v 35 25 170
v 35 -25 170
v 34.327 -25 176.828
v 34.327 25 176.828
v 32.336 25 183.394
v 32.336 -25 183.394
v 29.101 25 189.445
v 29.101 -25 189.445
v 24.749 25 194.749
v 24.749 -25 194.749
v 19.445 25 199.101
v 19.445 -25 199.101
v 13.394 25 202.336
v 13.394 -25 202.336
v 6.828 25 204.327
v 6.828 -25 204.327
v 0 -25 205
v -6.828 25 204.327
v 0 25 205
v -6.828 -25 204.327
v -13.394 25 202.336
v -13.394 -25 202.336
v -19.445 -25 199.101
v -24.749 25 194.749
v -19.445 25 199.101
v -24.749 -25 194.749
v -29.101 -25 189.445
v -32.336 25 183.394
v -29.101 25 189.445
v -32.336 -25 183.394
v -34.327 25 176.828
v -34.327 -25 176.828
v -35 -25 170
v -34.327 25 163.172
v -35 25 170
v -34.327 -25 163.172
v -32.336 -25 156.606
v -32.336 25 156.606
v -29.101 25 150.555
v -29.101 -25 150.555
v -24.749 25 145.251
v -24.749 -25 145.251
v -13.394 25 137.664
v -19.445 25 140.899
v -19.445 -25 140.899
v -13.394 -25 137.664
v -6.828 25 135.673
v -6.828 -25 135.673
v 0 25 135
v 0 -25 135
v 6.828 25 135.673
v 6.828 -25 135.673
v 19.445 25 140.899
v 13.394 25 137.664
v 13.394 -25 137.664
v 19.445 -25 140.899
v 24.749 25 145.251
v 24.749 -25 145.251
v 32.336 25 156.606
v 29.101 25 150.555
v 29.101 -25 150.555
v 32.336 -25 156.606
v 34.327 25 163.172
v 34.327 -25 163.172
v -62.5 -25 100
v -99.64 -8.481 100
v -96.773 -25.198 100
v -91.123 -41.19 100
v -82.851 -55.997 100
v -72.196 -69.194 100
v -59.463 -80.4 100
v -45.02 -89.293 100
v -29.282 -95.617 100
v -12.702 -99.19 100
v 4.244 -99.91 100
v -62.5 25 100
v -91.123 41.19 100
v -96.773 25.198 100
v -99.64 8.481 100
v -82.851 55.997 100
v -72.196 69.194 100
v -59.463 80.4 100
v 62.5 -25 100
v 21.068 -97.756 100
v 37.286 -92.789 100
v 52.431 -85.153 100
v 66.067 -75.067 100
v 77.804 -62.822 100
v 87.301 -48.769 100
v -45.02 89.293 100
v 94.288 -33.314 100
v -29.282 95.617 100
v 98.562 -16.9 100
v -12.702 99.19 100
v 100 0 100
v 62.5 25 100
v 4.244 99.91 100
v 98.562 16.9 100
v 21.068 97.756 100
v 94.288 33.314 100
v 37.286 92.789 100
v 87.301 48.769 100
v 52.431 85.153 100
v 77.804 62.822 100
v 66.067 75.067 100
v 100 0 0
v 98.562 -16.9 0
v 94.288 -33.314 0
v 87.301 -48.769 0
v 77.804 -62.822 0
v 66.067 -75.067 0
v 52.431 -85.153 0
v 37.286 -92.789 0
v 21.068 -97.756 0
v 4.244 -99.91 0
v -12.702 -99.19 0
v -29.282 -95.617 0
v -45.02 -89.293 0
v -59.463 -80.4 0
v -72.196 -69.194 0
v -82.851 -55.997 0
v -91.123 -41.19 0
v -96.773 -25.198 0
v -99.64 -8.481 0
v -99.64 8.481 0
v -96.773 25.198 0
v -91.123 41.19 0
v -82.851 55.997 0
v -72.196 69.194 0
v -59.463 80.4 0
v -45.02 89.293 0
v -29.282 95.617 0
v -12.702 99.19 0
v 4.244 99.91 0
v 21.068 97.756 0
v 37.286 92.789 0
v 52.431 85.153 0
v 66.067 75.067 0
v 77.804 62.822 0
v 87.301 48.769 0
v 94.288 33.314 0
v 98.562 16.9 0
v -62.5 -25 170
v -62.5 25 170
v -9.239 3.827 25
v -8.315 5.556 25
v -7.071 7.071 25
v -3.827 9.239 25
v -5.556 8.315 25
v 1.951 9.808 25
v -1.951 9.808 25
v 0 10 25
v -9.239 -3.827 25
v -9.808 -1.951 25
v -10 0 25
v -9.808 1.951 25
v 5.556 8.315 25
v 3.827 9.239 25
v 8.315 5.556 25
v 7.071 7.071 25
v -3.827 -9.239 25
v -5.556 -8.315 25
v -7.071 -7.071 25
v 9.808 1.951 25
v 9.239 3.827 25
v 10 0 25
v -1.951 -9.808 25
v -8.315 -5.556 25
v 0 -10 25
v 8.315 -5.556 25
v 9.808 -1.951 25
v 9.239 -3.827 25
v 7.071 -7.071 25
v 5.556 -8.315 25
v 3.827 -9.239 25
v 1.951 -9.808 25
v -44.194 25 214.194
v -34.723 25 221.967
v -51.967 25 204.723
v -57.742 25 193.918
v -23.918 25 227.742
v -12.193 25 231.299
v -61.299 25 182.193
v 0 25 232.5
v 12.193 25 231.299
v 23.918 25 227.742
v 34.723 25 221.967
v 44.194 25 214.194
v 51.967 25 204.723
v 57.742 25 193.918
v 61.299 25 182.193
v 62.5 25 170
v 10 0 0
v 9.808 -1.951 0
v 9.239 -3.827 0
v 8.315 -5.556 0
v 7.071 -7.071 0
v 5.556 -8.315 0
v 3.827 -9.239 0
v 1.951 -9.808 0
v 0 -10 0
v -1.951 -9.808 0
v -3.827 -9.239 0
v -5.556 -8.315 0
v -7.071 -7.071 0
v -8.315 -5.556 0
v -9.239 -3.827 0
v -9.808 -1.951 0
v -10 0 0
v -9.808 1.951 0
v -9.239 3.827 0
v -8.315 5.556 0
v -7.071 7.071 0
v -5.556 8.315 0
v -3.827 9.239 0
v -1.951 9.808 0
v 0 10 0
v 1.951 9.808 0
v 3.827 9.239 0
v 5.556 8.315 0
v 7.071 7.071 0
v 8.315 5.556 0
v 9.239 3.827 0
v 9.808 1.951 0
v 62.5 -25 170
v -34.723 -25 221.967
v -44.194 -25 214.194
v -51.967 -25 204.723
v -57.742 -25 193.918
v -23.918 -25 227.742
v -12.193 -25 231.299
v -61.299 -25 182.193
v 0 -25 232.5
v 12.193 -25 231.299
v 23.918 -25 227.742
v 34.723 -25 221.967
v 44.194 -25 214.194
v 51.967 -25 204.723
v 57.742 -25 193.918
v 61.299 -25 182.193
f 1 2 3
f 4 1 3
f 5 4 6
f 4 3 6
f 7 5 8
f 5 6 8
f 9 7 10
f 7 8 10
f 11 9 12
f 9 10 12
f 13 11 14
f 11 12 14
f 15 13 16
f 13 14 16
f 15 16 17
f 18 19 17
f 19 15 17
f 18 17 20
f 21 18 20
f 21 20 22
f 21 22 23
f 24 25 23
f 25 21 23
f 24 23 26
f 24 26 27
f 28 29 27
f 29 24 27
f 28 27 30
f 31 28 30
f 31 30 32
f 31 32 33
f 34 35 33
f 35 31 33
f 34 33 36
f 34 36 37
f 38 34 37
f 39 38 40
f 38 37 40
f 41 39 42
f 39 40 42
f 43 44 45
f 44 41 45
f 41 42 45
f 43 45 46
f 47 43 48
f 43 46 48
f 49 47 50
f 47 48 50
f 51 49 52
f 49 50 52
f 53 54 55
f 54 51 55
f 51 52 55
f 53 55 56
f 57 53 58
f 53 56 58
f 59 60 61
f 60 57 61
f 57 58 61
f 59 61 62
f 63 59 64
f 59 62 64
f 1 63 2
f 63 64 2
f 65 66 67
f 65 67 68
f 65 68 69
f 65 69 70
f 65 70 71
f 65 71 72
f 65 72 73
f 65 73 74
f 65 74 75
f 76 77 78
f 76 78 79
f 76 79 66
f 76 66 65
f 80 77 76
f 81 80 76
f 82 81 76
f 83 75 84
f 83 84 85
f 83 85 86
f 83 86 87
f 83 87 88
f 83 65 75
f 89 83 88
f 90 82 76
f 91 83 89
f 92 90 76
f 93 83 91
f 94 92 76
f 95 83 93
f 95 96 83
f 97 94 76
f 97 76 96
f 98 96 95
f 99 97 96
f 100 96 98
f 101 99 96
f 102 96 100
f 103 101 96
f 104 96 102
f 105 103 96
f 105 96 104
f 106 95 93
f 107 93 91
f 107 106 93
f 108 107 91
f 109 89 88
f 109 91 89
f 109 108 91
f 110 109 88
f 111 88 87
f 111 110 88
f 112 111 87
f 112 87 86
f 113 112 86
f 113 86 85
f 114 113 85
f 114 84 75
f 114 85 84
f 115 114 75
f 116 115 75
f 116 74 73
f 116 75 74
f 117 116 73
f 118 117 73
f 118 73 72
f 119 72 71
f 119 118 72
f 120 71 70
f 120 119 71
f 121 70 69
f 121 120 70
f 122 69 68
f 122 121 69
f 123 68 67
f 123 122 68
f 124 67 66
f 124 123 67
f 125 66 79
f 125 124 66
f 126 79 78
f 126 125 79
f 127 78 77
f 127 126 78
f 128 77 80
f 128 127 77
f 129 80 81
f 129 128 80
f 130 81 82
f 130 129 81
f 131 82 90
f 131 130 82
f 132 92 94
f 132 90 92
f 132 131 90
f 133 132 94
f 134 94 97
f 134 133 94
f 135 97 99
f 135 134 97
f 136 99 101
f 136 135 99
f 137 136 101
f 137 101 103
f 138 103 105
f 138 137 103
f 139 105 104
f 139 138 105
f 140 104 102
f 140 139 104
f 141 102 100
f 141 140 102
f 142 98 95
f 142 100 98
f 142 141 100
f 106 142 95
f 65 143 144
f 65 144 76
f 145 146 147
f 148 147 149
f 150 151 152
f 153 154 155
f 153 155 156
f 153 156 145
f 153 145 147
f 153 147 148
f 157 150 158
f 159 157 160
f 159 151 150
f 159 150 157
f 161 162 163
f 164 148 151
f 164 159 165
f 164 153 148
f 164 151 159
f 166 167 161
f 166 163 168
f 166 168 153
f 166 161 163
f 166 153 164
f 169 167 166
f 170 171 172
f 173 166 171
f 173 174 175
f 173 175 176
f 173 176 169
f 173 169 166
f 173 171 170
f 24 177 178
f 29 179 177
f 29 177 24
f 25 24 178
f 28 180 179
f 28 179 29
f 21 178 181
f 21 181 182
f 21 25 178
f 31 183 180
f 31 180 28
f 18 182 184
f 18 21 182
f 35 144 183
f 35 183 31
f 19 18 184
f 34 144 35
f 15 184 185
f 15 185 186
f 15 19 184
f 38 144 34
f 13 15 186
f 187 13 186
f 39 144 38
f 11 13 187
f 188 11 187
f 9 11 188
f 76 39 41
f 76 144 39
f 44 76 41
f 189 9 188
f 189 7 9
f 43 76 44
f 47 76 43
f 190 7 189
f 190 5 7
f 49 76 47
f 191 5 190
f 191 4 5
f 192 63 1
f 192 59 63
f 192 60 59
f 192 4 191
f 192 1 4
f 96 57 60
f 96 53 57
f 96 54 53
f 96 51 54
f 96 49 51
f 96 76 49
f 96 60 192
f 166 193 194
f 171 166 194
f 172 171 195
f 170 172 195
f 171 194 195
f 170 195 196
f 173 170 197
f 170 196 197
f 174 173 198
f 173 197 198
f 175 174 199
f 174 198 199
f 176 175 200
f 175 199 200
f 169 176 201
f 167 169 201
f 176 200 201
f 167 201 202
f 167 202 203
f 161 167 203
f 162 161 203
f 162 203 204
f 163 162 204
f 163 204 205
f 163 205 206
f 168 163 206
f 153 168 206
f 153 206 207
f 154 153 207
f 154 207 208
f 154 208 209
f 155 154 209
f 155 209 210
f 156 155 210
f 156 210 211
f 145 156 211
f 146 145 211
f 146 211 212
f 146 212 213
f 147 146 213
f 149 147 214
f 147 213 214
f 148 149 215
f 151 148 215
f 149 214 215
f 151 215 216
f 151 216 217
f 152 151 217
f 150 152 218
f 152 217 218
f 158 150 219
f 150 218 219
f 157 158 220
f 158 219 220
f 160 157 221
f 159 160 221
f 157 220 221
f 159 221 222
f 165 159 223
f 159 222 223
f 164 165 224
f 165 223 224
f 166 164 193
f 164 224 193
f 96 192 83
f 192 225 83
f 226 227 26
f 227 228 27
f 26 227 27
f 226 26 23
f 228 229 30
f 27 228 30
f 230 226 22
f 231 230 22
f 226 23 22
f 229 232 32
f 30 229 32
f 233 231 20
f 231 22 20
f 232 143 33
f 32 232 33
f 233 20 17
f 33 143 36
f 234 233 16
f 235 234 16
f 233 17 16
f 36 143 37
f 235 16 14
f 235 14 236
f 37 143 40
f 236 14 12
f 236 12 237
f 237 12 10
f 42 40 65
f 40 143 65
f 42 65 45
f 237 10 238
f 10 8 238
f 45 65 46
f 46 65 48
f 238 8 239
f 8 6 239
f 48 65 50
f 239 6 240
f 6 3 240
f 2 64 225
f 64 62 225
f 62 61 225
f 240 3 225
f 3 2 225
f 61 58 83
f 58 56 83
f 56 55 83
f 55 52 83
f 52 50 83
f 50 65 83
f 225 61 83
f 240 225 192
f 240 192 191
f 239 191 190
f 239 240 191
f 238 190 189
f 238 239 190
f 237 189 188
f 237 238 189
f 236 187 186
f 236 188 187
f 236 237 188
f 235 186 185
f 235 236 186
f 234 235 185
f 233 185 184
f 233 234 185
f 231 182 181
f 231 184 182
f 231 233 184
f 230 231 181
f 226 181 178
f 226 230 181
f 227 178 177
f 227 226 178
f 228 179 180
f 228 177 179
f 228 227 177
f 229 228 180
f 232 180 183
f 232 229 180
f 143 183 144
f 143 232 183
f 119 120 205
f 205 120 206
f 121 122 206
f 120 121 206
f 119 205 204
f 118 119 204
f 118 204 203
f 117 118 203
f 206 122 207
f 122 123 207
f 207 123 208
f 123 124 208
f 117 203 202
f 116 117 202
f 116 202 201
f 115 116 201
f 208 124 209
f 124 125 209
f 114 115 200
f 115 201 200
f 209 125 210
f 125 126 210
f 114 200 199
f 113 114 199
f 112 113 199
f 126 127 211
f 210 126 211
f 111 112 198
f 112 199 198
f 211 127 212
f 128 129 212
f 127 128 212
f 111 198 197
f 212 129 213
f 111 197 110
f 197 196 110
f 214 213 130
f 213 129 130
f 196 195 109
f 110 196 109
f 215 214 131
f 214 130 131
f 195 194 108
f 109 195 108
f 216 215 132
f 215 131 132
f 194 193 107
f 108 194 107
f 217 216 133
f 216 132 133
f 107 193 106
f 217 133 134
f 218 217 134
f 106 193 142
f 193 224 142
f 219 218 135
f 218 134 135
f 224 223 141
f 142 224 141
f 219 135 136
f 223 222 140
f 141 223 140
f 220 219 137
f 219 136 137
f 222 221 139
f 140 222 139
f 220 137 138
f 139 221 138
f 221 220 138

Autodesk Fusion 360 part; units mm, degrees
sketch "Sketch1" plane through (0, 0, 0) normal (0, 0, 1) x (1, 0, 0)
  circle A0 centre (0, 0) radius 100
  dimension "d1" = 200
extrude "Extrude1" add sketch "Sketch1" along normal blind 100
sketch "Sketch2" plane through (0, 0, 0) normal (0, 0, -1) x (1, 0, 0)
  circle A0 centre (0, 0) radius 100
  circle A1 centre (0, 0) radius 10
  dimension "d4" = 20
extrude "Extrude2" cut sketch "Sketch2" against normal blind 25 contours A1
sketch "Sketch3" plane through (0, 0, 0) normal (0, 1, 0) x (1, 0, 0)
  circle A0 centre (0, -170) radius 35
  line L0 (-62.5, -170) -> (-62.5, -100)
  line L1 (-62.5, -100) -> (62.5, -100)
  line L2 (62.5, -170) -> (62.5, -100)
  arc A1 (-62.5, -170) -> (62.5, -170) centre (0, -170) ccw
  dimension "d7" = 70
  dimension "d8" = 125
  dimension "d9" = 125
extrude "Extrude3" add sketch "Sketch3" along normal mid plane 50
